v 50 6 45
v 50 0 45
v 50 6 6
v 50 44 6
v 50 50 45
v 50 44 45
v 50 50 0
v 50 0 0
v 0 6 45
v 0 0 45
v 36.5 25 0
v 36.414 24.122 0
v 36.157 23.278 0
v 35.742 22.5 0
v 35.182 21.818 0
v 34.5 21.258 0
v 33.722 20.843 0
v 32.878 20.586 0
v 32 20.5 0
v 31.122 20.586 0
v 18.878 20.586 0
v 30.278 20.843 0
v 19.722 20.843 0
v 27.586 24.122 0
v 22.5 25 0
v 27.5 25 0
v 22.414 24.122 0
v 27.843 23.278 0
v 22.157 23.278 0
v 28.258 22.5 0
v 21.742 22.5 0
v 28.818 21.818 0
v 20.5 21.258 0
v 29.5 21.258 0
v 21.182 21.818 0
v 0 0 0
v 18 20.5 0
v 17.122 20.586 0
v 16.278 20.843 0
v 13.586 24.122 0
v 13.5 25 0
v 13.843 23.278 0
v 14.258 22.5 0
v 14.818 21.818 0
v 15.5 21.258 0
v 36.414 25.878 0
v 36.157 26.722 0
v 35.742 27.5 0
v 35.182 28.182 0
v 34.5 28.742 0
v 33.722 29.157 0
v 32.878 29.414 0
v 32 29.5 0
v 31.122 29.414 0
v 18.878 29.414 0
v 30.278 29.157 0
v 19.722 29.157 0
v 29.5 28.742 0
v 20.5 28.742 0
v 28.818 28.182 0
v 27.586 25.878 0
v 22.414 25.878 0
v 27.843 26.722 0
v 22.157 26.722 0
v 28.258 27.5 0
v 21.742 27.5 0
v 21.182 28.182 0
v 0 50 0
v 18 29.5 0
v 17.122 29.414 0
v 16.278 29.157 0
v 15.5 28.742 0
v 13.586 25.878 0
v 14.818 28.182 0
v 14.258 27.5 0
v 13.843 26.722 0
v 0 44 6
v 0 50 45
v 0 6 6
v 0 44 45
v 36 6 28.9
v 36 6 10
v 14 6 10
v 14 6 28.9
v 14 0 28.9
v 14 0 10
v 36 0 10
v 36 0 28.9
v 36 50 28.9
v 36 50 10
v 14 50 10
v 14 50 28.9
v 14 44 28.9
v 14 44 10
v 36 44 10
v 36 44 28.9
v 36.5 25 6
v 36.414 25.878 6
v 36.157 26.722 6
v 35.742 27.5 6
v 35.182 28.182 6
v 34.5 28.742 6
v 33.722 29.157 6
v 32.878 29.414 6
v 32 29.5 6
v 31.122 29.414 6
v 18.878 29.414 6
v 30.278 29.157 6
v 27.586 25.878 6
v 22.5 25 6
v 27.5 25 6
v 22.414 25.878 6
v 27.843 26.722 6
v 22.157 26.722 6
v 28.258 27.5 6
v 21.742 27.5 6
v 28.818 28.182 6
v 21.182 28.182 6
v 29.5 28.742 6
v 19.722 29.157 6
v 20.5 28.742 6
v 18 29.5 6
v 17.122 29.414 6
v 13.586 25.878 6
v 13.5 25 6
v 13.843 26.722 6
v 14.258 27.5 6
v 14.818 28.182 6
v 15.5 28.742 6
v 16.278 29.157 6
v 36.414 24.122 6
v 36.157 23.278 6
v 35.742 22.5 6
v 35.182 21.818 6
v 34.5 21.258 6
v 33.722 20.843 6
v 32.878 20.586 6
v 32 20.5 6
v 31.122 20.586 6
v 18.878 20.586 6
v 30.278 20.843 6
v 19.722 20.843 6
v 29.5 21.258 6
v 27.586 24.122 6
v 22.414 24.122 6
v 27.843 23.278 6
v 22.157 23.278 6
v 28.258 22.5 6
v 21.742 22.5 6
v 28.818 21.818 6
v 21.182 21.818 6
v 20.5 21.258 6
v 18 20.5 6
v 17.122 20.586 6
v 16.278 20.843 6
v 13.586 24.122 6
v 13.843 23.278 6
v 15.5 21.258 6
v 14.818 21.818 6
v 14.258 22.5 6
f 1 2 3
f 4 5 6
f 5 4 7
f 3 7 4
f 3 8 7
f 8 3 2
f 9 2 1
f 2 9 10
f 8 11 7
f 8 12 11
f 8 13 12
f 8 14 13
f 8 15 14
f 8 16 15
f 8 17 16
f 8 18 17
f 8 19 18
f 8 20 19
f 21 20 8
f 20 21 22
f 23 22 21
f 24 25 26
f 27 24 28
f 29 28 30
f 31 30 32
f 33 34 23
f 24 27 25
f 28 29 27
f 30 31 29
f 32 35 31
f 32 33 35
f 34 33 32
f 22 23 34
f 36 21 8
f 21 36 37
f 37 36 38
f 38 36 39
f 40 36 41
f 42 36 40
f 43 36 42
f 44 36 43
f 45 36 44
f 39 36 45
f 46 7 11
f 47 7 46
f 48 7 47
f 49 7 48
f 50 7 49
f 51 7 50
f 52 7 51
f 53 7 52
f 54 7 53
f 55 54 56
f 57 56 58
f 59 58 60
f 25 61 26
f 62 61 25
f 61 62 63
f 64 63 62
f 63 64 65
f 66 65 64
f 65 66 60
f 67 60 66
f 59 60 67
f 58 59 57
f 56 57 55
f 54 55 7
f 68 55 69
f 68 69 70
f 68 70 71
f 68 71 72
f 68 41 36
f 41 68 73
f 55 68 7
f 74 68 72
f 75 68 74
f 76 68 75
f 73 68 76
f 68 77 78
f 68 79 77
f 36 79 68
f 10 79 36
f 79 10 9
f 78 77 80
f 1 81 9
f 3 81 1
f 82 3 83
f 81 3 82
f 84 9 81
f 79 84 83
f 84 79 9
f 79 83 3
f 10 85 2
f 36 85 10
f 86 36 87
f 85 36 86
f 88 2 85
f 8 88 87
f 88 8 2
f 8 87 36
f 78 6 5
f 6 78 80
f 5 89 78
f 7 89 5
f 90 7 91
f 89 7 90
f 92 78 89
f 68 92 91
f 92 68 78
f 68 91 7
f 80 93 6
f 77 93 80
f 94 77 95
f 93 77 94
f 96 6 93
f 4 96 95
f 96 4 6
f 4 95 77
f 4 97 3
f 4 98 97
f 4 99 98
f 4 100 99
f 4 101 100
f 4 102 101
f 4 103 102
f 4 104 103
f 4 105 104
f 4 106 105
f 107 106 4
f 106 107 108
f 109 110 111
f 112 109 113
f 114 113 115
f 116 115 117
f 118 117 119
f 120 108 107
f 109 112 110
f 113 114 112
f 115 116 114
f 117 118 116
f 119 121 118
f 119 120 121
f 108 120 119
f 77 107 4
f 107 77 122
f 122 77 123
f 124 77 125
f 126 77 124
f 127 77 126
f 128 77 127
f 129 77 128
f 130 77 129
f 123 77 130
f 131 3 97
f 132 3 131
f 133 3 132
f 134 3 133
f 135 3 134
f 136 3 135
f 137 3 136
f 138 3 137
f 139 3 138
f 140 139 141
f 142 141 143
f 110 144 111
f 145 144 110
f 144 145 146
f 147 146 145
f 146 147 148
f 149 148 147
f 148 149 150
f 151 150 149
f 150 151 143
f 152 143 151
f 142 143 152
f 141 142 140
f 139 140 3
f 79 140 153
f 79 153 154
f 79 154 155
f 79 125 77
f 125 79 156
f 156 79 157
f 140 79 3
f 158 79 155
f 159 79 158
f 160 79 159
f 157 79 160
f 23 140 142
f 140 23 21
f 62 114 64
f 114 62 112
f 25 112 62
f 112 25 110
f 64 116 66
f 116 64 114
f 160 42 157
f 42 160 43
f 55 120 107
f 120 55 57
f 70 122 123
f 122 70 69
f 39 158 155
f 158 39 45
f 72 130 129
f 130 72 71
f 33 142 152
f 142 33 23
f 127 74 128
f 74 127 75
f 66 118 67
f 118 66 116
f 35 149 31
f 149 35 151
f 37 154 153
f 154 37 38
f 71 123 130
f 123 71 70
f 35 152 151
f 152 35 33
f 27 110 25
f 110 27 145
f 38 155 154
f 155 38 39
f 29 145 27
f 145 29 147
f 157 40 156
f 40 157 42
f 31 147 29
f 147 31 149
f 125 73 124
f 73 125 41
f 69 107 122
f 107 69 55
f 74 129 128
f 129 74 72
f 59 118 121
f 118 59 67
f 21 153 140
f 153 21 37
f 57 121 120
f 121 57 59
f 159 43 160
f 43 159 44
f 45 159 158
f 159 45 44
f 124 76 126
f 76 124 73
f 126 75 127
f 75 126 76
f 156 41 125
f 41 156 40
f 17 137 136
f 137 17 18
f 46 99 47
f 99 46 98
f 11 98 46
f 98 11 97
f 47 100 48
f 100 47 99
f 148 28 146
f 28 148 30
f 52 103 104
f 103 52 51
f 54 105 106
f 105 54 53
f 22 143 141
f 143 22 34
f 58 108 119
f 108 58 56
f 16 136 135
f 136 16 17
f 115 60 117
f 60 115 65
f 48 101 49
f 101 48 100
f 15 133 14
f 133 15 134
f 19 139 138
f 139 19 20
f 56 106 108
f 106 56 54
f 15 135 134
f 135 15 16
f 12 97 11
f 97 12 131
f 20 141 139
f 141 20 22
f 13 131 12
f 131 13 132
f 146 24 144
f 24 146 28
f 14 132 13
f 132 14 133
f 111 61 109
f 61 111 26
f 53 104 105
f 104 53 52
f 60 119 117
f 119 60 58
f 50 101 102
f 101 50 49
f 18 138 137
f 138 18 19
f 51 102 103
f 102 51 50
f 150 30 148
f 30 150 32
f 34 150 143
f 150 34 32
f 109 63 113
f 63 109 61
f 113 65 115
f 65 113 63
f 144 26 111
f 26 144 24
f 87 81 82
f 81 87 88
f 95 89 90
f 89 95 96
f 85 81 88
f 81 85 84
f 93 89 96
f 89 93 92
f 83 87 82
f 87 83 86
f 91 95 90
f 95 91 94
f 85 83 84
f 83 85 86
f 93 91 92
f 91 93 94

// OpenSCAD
$fn = 32;

// ----------------------------------------------------------------------
// U-bracket: 50 x 50 x 45 mm
// ----------------------------------------------------------------------

// --- parameters (mm) ---
rail_len = 50;            // outer length, X
jaw_w = 50;               // outer width, Y
jaw_h = 45;               // upright height, Z
web_t = 6;                // wall thickness
hole_d = 9;               // clearance for M8
window_l = 22;            // window length
window_h = 18.9;          // window height

module hole_z(px, py) {
  translate([px, py, -0.5]) cylinder(h = web_t + 1, d = hole_d);
}
module hole_y_pz(pz) {
  /* through both uprights along Y */
  translate([0, -0.5, pz]) rotate([-90, 0, 0]) cylinder(h = jaw_w + 1, d = hole_d);
}

module base() {
  cube([rail_len, jaw_w, web_t]);
}

module uprights() {
  cube([rail_len, web_t, jaw_h]);
  translate([0, jaw_w - web_t, 0]) cube([rail_len, web_t, jaw_h]);
}

difference() {
  union() {
    base();
    uprights();
  }
  hole_z(18, 25);
  hole_z(32, 25);
  /* lightening window through both uprights */
  translate([rail_len / 2 - window_l / 2, -1, web_t + 4])
    cube([window_l, jaw_w + 2, window_h]);
}
